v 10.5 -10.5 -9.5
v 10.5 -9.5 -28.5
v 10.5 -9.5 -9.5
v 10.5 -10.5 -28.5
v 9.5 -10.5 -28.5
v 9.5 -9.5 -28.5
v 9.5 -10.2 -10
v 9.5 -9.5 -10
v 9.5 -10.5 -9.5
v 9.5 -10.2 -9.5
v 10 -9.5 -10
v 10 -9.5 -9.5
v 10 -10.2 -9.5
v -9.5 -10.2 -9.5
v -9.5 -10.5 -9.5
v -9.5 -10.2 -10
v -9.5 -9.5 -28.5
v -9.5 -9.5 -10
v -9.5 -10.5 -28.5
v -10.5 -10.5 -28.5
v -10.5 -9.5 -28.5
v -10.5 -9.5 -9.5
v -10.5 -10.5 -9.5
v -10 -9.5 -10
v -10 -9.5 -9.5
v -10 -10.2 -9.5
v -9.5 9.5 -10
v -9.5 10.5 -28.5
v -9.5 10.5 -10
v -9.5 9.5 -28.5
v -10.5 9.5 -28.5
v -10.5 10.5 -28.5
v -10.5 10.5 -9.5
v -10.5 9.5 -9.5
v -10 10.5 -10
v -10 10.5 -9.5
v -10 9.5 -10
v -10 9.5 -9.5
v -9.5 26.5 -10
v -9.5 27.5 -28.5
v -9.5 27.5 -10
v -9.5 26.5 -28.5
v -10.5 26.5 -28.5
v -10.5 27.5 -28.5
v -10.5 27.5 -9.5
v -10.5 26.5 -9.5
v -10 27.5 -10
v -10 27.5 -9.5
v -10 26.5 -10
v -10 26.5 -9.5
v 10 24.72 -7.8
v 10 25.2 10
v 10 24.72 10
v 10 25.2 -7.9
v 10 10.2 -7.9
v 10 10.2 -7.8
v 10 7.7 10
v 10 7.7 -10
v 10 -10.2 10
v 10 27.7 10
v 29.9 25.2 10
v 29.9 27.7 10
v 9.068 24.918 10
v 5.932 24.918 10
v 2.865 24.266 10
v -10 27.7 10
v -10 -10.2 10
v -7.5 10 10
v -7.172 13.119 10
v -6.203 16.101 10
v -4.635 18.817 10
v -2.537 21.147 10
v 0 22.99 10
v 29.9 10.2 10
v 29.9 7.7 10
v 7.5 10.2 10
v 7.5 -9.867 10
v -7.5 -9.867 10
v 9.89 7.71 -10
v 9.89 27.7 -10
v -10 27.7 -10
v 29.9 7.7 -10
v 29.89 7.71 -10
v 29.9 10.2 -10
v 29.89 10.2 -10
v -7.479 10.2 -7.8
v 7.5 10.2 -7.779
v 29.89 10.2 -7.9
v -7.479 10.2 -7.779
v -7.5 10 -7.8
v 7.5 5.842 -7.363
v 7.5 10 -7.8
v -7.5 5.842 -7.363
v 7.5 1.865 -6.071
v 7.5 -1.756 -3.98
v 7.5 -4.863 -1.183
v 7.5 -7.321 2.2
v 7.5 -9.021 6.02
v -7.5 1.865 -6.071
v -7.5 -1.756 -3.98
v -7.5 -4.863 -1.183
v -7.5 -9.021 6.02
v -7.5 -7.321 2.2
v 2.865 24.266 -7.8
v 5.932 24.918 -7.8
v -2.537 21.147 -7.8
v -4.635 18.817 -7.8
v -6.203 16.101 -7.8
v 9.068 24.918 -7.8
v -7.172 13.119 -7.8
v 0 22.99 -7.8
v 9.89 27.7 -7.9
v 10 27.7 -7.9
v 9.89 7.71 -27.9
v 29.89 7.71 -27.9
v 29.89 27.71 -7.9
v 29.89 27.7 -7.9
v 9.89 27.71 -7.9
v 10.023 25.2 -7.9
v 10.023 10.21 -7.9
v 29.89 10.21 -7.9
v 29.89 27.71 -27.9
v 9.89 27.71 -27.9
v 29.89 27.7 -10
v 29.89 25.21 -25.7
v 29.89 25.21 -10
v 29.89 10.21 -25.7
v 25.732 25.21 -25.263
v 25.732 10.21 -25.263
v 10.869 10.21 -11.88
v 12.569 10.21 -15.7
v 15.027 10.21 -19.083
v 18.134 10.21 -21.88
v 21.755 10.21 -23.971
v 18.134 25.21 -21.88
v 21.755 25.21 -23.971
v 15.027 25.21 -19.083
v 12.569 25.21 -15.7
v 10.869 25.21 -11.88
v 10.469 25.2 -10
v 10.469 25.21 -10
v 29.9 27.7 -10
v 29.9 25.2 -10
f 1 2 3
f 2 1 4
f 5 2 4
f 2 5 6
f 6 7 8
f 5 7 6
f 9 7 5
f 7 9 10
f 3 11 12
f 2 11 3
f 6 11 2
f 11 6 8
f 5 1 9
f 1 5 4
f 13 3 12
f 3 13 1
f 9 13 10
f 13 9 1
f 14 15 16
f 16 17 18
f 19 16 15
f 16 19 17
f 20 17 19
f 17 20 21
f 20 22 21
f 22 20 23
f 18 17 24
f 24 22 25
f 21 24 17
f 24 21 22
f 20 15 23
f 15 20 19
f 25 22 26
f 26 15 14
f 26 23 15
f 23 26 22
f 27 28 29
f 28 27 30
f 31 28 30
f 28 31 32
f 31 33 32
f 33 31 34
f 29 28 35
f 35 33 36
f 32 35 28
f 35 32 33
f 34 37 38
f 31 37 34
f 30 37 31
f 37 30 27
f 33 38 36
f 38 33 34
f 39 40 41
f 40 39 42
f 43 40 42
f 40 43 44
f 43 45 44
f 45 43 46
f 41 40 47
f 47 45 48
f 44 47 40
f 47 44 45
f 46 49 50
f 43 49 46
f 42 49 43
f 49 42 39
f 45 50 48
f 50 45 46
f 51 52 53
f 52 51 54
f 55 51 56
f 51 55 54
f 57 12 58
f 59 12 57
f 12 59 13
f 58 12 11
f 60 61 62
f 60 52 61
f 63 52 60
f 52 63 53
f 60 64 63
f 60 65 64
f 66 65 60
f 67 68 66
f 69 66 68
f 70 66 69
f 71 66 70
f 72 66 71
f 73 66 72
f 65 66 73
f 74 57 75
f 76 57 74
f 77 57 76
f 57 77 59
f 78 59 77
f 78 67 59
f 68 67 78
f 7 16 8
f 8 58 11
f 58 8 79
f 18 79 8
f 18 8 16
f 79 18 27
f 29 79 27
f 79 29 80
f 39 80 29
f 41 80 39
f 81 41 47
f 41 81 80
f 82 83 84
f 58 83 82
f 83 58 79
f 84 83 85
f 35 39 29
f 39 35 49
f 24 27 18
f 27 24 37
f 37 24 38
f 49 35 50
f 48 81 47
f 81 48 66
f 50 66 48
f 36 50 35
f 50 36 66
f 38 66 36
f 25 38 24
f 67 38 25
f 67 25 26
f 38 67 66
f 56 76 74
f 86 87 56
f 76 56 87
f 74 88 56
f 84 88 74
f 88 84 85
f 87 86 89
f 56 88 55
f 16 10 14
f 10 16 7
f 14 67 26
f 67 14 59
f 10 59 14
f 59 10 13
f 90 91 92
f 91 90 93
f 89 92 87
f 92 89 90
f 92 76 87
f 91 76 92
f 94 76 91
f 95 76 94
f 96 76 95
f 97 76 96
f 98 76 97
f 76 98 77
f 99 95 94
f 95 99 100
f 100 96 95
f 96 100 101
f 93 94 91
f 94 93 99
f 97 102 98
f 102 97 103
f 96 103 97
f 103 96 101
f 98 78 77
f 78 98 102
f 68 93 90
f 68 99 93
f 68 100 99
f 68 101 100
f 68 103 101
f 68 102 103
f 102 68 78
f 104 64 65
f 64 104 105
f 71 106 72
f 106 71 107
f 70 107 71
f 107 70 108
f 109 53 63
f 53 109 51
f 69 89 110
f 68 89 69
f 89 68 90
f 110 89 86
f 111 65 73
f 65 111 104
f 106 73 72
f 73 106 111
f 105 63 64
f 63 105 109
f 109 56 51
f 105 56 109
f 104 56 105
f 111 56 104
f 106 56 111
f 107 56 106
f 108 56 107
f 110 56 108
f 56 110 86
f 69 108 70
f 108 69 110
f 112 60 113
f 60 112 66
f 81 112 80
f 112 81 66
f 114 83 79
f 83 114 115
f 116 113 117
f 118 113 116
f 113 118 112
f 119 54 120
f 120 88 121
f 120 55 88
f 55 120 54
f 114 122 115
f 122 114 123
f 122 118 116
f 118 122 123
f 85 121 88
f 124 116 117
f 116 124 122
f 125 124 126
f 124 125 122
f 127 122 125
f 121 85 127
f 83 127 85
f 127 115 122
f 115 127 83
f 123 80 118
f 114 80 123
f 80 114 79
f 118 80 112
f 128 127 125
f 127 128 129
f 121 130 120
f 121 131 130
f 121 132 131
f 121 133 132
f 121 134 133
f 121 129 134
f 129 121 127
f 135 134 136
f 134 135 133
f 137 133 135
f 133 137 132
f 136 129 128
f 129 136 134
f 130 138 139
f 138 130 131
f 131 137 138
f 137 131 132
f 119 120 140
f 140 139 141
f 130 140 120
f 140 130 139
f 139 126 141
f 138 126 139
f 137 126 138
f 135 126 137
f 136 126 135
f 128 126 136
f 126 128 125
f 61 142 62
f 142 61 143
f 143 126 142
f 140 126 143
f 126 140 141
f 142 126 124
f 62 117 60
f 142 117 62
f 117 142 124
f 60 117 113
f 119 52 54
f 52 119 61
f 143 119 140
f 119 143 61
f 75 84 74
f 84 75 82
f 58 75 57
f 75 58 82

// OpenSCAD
/*I reworked some basic formatting, and put all uses of modules below the module definitions.
There are some comments like "wall 1" and "wall 2" that are not useful for anyone who 
does not have the model in his head.  The for loops are also mysterious at first glance
sans comments.  Variables and module parameters could also do with some explanation.*/

cubesize = 1;
length = 10;
height = 18;


//vertical ramp module
module ramp(CubeSize,CylSize1,CylSize2,curvature){
    difference(){
        //cube for outer "shell" of ramp
        cube(CubeSize,center=true);
            
        //rotated cylinder to mark curve that will be within the cube to form the ramp
        rotate([90,90,90])
        translate([-12.2,10,0])
        cylinder(CylSize1,curvature,CylSize2, center=true);
    }
}

//90 degree turn module
module turn(){
    difference(){
        //cube "shell"
        translate([0,20,0])
        cube([20,20,20],center=true);
        //cylinder for curve
        translate([7.5,10,1.2])
        cylinder(18,15,15,center=true);
    }
}


for (pillar = [0 : cubesize :  height]){
    translate([10,-10,pillar-28])
    cube(size = cubesize, center = true);
}
for (pillar = [0 : cubesize :  height]){
    translate([-10,-10,pillar-28])
    cube(size = cubesize, center = true);
}

for (pillar = [0 : cubesize :  height]){
    translate([-10,10,pillar-28])
    cube(size = cubesize, center = true);
}

for (pillar = [0 : cubesize :  height]){
    translate([-10,27,pillar-28])
    cube(size = cubesize, center = true);
}

//render first ramp
ramp([20,20.4,20],15,20,20);

difference(){
    //render turn
    turn();
    //cube to shave off part of ramp in difference function
    translate([-10,27.7,-10])
    cube([20,3.5,20]);
}

//render final ramp
rotate([0,0,270])
translate([-17.71,19.89,-17.9])
ramp(20,15,20,20);

//wall 1
translate([10,25.2,-10])
cube([19.9,2.5,20]);

//wall 2
translate([10,7.7,-10])
cube([19.9,2.5,20]);
